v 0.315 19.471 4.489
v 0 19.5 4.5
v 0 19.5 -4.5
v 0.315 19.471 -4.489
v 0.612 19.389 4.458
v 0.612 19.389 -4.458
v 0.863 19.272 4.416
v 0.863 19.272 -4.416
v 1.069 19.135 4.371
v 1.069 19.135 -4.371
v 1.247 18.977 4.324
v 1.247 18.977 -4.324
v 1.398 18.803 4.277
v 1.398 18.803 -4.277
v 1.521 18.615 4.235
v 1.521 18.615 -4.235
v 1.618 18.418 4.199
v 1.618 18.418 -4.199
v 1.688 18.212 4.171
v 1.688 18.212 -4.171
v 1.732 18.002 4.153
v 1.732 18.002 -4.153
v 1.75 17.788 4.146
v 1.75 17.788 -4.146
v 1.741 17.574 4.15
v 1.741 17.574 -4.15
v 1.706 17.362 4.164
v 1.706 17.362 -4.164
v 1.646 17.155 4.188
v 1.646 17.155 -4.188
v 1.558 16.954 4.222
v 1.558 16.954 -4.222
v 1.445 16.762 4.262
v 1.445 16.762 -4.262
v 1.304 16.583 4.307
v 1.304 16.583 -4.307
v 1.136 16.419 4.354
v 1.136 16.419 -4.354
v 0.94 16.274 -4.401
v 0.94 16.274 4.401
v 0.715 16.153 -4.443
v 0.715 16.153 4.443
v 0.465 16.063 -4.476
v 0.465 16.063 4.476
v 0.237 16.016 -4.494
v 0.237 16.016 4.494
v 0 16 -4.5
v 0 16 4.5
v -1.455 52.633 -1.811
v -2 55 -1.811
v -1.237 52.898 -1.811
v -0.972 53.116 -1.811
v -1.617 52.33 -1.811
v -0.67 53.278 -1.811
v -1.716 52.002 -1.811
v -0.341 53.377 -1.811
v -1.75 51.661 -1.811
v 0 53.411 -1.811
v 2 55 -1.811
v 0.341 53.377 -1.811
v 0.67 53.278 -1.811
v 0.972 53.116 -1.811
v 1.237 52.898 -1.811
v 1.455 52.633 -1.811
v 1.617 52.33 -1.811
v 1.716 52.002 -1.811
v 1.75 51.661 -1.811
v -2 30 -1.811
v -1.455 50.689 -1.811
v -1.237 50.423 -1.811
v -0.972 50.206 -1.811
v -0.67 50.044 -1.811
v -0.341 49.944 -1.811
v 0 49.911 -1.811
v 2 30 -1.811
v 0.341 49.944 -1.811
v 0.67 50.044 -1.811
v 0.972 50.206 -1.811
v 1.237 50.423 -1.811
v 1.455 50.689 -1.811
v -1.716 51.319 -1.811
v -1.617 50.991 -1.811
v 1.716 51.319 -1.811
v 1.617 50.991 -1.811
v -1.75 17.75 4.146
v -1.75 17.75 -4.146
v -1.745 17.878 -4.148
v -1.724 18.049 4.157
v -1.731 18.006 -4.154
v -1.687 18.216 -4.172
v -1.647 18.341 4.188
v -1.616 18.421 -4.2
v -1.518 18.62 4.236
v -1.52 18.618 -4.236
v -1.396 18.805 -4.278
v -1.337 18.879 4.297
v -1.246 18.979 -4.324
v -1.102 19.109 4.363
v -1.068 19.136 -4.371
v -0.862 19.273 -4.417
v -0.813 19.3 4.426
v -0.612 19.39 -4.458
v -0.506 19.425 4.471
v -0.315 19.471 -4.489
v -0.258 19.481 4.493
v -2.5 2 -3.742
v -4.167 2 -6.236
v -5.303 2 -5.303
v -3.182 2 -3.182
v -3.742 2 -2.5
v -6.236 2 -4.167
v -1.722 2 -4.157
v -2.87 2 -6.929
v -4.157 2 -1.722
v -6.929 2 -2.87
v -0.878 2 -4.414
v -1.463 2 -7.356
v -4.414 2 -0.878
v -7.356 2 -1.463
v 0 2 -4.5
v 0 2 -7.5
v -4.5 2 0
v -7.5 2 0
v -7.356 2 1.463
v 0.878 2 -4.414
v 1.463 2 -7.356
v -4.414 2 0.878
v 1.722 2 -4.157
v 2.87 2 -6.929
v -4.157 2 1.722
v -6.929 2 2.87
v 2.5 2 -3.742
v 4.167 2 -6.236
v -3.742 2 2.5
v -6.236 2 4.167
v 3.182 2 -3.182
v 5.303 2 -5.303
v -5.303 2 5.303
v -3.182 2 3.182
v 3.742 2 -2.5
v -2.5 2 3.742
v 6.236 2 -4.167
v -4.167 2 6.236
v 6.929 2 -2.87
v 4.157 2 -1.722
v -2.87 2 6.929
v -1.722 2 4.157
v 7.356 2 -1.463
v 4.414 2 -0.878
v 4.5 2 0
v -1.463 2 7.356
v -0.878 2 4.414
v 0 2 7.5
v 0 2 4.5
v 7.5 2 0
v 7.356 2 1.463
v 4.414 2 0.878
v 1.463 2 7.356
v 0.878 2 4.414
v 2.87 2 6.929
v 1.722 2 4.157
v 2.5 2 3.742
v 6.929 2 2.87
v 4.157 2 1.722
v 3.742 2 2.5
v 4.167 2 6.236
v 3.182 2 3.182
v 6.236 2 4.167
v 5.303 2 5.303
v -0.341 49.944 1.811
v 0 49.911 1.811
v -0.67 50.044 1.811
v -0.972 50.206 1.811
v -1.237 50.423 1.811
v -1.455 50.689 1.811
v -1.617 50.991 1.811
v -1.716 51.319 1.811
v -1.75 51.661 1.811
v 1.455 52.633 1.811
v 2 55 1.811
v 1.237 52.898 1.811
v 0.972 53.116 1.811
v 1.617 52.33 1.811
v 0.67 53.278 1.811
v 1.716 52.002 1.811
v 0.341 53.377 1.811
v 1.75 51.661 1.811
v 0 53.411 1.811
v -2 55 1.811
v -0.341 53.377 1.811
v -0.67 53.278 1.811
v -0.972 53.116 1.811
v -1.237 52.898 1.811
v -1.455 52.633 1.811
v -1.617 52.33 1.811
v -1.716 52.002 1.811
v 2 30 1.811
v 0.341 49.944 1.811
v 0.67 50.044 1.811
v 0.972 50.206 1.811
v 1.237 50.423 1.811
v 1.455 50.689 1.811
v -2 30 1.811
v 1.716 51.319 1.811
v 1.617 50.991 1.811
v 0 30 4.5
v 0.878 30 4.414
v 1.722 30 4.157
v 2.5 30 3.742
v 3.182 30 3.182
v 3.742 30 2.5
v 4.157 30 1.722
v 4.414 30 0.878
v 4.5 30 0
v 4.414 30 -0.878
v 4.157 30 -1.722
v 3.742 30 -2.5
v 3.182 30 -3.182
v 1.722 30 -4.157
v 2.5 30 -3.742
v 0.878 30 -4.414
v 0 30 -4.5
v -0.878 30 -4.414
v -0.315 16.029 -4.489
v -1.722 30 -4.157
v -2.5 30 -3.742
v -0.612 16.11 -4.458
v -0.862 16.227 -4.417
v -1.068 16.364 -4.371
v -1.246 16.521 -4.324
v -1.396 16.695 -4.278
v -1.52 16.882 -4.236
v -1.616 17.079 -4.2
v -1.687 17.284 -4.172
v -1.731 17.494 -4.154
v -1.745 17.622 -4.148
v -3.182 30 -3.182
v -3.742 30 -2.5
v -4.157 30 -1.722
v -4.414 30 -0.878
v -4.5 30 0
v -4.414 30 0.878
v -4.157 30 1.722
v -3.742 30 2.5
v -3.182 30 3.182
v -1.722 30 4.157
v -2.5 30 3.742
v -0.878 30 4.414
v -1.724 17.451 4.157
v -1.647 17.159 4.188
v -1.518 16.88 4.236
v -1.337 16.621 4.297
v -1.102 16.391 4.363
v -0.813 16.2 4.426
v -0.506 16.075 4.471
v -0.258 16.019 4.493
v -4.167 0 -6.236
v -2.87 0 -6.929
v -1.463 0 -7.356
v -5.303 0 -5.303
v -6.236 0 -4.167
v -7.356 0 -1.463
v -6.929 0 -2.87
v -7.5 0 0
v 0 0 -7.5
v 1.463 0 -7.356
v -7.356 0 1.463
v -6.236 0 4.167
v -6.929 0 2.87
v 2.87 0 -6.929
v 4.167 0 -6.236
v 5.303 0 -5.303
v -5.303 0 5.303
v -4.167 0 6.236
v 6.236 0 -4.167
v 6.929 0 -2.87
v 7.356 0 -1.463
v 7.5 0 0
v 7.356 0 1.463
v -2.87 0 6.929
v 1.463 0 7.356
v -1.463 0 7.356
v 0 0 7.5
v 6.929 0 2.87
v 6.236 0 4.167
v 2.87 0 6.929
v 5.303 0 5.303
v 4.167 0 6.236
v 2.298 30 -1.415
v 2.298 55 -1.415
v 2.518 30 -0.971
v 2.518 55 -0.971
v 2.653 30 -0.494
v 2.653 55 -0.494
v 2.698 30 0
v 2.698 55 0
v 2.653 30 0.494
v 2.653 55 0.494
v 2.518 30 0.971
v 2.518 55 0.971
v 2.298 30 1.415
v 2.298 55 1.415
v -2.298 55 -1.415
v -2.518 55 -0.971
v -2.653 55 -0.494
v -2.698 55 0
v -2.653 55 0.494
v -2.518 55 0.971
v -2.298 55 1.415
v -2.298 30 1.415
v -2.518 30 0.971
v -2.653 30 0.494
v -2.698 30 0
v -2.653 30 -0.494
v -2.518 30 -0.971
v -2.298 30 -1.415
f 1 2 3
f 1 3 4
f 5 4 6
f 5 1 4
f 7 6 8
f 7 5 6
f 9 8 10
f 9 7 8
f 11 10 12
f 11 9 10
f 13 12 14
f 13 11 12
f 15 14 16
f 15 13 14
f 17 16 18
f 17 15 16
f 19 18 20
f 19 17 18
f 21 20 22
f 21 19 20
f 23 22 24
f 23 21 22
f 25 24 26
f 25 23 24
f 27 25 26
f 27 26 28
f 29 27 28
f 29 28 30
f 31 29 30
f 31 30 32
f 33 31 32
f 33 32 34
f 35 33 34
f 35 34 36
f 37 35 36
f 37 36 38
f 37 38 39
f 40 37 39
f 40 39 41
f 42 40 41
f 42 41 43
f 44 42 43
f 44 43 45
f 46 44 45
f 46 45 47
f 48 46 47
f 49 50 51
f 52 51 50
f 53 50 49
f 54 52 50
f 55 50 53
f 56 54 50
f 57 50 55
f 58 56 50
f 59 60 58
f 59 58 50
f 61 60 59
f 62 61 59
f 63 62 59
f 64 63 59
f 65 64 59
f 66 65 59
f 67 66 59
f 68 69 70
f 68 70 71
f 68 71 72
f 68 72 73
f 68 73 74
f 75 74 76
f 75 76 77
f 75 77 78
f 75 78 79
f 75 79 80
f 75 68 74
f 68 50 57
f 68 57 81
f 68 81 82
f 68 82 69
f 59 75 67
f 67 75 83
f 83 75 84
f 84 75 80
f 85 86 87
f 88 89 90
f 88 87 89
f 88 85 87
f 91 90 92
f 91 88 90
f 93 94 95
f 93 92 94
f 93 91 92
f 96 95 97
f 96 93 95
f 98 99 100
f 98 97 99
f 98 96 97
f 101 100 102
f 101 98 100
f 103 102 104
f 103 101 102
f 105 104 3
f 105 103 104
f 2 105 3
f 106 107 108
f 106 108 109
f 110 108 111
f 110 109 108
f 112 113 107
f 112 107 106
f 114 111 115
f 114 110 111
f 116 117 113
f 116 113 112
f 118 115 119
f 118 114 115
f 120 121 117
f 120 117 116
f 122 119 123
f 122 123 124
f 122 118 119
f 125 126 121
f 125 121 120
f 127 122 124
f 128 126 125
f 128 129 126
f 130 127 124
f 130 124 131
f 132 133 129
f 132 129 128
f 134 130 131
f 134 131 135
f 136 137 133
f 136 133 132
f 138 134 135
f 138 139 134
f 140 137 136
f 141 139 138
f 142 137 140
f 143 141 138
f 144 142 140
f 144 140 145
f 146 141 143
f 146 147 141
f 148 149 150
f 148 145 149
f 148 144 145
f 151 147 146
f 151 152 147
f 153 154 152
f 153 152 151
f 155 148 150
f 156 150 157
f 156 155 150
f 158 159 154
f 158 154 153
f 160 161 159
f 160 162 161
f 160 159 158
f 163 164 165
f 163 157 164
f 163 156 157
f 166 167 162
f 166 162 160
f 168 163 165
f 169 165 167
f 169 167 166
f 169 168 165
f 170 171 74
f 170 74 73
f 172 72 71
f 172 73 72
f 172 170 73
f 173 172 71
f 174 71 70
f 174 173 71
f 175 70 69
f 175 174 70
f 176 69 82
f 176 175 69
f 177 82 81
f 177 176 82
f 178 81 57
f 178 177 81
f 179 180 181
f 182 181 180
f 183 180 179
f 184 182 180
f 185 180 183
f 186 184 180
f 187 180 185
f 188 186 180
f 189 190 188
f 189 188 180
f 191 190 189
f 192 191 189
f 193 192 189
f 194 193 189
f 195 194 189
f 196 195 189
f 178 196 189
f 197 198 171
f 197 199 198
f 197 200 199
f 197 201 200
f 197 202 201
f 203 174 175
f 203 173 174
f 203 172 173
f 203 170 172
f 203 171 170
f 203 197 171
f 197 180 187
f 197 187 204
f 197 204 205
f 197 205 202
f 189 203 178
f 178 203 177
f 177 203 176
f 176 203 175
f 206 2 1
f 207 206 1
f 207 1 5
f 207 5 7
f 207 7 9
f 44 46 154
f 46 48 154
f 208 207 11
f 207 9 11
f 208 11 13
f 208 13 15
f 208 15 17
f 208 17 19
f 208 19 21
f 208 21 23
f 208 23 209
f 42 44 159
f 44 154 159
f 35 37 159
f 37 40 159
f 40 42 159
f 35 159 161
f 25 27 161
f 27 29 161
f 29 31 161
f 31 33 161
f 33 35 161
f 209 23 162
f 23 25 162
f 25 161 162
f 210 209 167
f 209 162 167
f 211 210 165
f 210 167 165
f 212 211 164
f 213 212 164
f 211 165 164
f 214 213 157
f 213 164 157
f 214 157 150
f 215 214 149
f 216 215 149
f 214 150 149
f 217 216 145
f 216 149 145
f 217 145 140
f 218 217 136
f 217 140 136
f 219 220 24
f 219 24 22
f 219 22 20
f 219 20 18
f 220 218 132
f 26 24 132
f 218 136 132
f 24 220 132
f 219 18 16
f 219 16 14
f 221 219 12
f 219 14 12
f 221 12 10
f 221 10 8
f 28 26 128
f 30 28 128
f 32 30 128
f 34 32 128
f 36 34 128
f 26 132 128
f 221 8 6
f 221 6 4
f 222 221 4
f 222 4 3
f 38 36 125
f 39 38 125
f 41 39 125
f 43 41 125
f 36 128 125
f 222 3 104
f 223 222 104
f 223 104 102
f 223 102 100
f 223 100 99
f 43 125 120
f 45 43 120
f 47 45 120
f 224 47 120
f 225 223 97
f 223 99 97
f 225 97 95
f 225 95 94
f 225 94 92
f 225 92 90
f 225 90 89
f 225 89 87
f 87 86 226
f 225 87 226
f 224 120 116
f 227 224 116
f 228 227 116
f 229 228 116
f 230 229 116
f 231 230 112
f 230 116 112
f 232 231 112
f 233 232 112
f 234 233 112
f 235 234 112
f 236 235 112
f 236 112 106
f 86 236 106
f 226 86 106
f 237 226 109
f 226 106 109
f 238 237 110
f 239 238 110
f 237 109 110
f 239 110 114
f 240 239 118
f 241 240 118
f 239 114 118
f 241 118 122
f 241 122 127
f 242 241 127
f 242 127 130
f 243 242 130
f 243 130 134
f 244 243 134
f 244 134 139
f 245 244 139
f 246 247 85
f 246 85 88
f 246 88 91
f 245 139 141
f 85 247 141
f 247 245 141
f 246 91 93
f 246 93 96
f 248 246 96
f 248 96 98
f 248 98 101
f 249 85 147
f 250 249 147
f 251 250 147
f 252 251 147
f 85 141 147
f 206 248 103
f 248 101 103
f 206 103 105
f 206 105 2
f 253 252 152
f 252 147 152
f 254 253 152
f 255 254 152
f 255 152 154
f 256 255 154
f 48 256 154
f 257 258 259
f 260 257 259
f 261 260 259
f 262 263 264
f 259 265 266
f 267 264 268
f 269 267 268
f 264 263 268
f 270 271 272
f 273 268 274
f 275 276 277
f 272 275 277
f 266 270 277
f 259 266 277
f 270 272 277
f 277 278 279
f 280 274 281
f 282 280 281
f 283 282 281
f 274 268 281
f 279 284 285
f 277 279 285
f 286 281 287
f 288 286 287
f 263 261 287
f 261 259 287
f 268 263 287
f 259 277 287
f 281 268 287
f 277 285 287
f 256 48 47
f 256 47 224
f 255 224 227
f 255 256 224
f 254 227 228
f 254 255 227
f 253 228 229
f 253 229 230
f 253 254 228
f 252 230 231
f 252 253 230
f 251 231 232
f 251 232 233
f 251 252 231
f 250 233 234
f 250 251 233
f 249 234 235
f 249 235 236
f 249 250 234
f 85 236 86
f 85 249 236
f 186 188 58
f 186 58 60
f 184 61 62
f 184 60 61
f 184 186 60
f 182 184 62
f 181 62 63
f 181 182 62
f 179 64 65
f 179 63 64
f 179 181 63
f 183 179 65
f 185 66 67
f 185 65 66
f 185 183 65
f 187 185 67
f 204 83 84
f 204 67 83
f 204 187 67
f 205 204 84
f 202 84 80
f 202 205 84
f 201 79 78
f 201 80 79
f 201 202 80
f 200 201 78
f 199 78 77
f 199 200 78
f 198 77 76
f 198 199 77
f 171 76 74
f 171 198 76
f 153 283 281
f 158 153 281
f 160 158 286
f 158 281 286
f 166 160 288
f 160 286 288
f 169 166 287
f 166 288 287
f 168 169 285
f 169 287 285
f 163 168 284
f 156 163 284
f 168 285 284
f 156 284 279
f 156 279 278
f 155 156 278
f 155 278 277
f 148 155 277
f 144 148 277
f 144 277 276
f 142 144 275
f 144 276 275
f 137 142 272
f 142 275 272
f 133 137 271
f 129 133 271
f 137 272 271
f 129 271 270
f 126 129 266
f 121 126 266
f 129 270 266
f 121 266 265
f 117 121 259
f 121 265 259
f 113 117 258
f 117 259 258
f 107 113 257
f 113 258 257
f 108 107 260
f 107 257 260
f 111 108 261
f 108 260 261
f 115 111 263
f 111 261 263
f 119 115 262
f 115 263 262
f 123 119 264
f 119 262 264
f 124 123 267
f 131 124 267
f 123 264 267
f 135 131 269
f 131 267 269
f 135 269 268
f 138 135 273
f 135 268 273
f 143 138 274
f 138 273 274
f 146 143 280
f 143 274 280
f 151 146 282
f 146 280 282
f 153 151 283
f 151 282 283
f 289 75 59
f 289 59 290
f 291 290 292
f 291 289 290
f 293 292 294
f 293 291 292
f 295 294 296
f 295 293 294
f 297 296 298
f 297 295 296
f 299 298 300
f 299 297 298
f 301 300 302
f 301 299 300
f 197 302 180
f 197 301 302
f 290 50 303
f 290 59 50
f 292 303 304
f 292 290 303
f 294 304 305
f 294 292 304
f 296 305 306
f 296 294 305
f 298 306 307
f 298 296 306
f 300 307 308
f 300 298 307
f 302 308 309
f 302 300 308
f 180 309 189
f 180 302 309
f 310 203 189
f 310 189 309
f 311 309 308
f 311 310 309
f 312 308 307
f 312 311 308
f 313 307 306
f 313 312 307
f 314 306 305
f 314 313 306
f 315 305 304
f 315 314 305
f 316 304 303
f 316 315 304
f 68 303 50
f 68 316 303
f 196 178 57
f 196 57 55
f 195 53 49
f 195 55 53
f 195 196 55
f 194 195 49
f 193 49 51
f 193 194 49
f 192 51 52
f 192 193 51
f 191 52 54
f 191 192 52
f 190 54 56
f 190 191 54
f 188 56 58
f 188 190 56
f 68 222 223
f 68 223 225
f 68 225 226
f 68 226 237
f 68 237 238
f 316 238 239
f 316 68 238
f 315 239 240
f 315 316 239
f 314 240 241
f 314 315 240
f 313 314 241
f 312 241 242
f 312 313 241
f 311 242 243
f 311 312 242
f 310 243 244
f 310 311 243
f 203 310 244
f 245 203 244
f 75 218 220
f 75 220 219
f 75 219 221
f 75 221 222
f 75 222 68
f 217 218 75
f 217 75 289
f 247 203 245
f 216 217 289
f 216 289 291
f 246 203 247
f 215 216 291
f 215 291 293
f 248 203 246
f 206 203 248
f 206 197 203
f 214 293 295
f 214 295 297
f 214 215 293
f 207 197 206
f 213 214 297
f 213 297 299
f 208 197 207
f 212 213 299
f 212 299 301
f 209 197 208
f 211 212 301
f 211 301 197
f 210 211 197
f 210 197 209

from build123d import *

# Parameters (mm, degrees)
SKETCH1_R               = 7.5
SKETCH1_R_2             = 4.5
BOSS_EXTRUDE1_DEPTH     = 2
SKETCH1_2_R             = 4.5
BOSS_EXTRUDE2_DEPTH     = 55
CUT_EXTRUDE1_START      = -25
SKETCH2_R               = 4.5
CUT_EXTRUDE1_DEPTH      = 25
CUT_EXTRUDE2_DEPTH      = 25
CUT_EXTRUDE2_DEPTH_BACK = 25
SKETCH3_R               = 1.75


with BuildPart() as part:
    # Sketch1 → Boss-Extrude1 (new body)
    with BuildSketch(Plane(origin=(0, 0, 0), x_dir=(1, 0, 0), z_dir=(0, 1, 0))):
        Circle(SKETCH1_R)
        Circle(SKETCH1_R_2, mode=Mode.SUBTRACT)
    extrude(amount=BOSS_EXTRUDE1_DEPTH)

    # Sketch1<2> → Boss-Extrude2 (add)
    with BuildSketch(Plane(origin=(0, 0, 0), x_dir=(1, 0, 0), z_dir=(0, 1, 0))):
        Circle(SKETCH1_2_R)
    extrude(amount=BOSS_EXTRUDE2_DEPTH)

    # Sketch2 → Cut-Extrude1 (cut)
    with BuildSketch(Plane(origin=(0, 55, 0), x_dir=(1, 0, 0), z_dir=(0, 1, 0)).offset(CUT_EXTRUDE1_START)):
        Circle(SKETCH2_R)
        with BuildLine():
            Line((-2, 1.811376185), (2, 1.811376185))
            ThreePointArc((2, 1.811376185), (2.698348325, 0), (2, -1.811376185))
            Line((2, -1.811376185), (-2, -1.811376185))
            ThreePointArc((-2, -1.811376185), (-2.698348325, 0), (-2, 1.811376185))
        make_face(mode=Mode.SUBTRACT)
    extrude(amount=CUT_EXTRUDE1_DEPTH, mode=Mode.SUBTRACT)

    # Sketch3 → Cut-Extrude2 (cut, two sides: drawn at the far end of the back side and taken through both)
    with BuildSketch(Plane(origin=(0, 0, -1.811376185), x_dir=(-1, 0, 0), z_dir=(0, 0, -1)).offset(-CUT_EXTRUDE2_DEPTH_BACK)):
        with Locations((0, 51.660798888)):
            Circle(SKETCH3_R)
        with Locations((0, 17.75)):
            Circle(SKETCH3_R)
    extrude(amount=CUT_EXTRUDE2_DEPTH + CUT_EXTRUDE2_DEPTH_BACK, mode=Mode.SUBTRACT)


solid = part.part
